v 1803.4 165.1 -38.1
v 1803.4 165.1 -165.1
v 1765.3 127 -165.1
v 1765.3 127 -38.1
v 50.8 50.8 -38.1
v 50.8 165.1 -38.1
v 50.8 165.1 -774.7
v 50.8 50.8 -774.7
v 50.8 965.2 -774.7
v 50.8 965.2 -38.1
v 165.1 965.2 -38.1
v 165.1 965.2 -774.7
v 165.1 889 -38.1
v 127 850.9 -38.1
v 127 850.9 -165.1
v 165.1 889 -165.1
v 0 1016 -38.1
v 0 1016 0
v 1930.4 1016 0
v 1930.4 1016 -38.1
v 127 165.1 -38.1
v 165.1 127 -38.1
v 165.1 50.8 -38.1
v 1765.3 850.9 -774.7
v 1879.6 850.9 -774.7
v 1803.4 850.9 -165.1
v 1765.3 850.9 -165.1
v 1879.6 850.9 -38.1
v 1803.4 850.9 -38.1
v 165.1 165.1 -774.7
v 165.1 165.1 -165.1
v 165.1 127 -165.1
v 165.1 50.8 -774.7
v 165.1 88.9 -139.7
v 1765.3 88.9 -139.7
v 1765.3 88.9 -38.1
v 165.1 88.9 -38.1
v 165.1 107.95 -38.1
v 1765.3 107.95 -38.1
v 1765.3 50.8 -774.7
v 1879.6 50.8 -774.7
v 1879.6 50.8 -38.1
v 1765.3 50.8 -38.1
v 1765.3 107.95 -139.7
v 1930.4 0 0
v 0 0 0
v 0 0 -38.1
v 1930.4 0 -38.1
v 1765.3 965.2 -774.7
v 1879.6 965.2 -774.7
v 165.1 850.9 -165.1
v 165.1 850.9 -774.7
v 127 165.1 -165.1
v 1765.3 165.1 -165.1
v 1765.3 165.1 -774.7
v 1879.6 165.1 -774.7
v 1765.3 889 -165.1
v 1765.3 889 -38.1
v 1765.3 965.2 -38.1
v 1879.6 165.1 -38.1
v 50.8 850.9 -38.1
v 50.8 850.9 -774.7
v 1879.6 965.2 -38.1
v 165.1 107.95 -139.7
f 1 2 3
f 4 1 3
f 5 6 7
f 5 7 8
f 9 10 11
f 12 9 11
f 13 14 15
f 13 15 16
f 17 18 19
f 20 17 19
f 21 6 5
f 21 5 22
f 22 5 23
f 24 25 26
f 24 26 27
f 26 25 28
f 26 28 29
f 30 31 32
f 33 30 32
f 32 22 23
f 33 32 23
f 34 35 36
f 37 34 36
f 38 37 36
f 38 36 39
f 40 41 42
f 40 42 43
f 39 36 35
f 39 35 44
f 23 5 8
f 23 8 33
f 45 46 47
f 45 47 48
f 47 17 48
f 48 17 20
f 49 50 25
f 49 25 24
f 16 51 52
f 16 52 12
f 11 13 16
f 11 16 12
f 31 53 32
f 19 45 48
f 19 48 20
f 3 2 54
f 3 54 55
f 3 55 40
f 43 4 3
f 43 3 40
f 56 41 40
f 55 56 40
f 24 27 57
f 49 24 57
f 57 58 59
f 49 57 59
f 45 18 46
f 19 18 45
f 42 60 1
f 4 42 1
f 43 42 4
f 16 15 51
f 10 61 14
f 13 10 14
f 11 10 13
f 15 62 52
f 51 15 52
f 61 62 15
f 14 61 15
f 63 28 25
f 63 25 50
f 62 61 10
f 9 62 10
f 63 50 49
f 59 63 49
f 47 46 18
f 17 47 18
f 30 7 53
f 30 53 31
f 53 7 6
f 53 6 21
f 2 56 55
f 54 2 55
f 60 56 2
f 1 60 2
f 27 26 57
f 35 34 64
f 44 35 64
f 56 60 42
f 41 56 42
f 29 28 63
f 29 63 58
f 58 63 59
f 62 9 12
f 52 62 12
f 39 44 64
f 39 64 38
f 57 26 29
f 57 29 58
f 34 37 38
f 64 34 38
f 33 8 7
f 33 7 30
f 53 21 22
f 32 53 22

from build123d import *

# Parameters (mm, degrees)
F0_W      = 1930.4
F0_H      = 1016
F1_DEPTH  = 38.1
F3_W      = 114.3
F3_H      = 114.3
F4_DEPTH  = 736.6
F7_DEPTH  = 127
F10_W     = 19.05
F10_H     = 101.6
F11_DEPTH = 1600.2


with BuildPart() as f1:
    # F0 (on Top) → F1 (new body)
    with BuildSketch(Plane.XY):
        with Locations((965.2, 508)):
            Rectangle(F0_W, F0_H)
    extrude(amount=-F1_DEPTH)


with BuildPart() as f4:
    # F3 (on face) → F4 (new body)
    with BuildSketch(Plane(origin=(0, 0, -38.1), x_dir=(1, 0, 0), z_dir=(0, 0, -1))):
        with Locations((107.95, -107.95)):
            Rectangle(F3_W, F3_H)
    extrude(amount=F4_DEPTH)

    # F6 (on face) → F7 (cut)
    with BuildSketch(Plane.XY.offset(-38.1)):
        Polygon((165.1, 165.1), (127, 165.1), (165.1, 127), align=None)
    extrude(amount=-F7_DEPTH, mode=Mode.SUBTRACT)


with BuildPart() as f8_1:
    # F8: instance of F4
    add(f4.part.mirror(Plane.XZ.offset(-508)))


with BuildPart() as f9_1:
    # F9: instance of F8_1
    add(f8_1.part.mirror(Plane.YZ.offset(965.2)))


with BuildPart() as f9_2:
    # F9: instance of F4
    add(f4.part.mirror(Plane.YZ.offset(965.2)))


with BuildPart() as f11:
    # F10 (on face) → F11 (new body, through all)
    with BuildSketch(Plane.YZ.offset(165.1)):
        with Locations((98.425, -88.9)):
            Rectangle(F10_W, F10_H)
    extrude(amount=F11_DEPTH)


solid = Compound([f1.part, f4.part, f8_1.part, f9_1.part, f9_2.part, f11.part])
